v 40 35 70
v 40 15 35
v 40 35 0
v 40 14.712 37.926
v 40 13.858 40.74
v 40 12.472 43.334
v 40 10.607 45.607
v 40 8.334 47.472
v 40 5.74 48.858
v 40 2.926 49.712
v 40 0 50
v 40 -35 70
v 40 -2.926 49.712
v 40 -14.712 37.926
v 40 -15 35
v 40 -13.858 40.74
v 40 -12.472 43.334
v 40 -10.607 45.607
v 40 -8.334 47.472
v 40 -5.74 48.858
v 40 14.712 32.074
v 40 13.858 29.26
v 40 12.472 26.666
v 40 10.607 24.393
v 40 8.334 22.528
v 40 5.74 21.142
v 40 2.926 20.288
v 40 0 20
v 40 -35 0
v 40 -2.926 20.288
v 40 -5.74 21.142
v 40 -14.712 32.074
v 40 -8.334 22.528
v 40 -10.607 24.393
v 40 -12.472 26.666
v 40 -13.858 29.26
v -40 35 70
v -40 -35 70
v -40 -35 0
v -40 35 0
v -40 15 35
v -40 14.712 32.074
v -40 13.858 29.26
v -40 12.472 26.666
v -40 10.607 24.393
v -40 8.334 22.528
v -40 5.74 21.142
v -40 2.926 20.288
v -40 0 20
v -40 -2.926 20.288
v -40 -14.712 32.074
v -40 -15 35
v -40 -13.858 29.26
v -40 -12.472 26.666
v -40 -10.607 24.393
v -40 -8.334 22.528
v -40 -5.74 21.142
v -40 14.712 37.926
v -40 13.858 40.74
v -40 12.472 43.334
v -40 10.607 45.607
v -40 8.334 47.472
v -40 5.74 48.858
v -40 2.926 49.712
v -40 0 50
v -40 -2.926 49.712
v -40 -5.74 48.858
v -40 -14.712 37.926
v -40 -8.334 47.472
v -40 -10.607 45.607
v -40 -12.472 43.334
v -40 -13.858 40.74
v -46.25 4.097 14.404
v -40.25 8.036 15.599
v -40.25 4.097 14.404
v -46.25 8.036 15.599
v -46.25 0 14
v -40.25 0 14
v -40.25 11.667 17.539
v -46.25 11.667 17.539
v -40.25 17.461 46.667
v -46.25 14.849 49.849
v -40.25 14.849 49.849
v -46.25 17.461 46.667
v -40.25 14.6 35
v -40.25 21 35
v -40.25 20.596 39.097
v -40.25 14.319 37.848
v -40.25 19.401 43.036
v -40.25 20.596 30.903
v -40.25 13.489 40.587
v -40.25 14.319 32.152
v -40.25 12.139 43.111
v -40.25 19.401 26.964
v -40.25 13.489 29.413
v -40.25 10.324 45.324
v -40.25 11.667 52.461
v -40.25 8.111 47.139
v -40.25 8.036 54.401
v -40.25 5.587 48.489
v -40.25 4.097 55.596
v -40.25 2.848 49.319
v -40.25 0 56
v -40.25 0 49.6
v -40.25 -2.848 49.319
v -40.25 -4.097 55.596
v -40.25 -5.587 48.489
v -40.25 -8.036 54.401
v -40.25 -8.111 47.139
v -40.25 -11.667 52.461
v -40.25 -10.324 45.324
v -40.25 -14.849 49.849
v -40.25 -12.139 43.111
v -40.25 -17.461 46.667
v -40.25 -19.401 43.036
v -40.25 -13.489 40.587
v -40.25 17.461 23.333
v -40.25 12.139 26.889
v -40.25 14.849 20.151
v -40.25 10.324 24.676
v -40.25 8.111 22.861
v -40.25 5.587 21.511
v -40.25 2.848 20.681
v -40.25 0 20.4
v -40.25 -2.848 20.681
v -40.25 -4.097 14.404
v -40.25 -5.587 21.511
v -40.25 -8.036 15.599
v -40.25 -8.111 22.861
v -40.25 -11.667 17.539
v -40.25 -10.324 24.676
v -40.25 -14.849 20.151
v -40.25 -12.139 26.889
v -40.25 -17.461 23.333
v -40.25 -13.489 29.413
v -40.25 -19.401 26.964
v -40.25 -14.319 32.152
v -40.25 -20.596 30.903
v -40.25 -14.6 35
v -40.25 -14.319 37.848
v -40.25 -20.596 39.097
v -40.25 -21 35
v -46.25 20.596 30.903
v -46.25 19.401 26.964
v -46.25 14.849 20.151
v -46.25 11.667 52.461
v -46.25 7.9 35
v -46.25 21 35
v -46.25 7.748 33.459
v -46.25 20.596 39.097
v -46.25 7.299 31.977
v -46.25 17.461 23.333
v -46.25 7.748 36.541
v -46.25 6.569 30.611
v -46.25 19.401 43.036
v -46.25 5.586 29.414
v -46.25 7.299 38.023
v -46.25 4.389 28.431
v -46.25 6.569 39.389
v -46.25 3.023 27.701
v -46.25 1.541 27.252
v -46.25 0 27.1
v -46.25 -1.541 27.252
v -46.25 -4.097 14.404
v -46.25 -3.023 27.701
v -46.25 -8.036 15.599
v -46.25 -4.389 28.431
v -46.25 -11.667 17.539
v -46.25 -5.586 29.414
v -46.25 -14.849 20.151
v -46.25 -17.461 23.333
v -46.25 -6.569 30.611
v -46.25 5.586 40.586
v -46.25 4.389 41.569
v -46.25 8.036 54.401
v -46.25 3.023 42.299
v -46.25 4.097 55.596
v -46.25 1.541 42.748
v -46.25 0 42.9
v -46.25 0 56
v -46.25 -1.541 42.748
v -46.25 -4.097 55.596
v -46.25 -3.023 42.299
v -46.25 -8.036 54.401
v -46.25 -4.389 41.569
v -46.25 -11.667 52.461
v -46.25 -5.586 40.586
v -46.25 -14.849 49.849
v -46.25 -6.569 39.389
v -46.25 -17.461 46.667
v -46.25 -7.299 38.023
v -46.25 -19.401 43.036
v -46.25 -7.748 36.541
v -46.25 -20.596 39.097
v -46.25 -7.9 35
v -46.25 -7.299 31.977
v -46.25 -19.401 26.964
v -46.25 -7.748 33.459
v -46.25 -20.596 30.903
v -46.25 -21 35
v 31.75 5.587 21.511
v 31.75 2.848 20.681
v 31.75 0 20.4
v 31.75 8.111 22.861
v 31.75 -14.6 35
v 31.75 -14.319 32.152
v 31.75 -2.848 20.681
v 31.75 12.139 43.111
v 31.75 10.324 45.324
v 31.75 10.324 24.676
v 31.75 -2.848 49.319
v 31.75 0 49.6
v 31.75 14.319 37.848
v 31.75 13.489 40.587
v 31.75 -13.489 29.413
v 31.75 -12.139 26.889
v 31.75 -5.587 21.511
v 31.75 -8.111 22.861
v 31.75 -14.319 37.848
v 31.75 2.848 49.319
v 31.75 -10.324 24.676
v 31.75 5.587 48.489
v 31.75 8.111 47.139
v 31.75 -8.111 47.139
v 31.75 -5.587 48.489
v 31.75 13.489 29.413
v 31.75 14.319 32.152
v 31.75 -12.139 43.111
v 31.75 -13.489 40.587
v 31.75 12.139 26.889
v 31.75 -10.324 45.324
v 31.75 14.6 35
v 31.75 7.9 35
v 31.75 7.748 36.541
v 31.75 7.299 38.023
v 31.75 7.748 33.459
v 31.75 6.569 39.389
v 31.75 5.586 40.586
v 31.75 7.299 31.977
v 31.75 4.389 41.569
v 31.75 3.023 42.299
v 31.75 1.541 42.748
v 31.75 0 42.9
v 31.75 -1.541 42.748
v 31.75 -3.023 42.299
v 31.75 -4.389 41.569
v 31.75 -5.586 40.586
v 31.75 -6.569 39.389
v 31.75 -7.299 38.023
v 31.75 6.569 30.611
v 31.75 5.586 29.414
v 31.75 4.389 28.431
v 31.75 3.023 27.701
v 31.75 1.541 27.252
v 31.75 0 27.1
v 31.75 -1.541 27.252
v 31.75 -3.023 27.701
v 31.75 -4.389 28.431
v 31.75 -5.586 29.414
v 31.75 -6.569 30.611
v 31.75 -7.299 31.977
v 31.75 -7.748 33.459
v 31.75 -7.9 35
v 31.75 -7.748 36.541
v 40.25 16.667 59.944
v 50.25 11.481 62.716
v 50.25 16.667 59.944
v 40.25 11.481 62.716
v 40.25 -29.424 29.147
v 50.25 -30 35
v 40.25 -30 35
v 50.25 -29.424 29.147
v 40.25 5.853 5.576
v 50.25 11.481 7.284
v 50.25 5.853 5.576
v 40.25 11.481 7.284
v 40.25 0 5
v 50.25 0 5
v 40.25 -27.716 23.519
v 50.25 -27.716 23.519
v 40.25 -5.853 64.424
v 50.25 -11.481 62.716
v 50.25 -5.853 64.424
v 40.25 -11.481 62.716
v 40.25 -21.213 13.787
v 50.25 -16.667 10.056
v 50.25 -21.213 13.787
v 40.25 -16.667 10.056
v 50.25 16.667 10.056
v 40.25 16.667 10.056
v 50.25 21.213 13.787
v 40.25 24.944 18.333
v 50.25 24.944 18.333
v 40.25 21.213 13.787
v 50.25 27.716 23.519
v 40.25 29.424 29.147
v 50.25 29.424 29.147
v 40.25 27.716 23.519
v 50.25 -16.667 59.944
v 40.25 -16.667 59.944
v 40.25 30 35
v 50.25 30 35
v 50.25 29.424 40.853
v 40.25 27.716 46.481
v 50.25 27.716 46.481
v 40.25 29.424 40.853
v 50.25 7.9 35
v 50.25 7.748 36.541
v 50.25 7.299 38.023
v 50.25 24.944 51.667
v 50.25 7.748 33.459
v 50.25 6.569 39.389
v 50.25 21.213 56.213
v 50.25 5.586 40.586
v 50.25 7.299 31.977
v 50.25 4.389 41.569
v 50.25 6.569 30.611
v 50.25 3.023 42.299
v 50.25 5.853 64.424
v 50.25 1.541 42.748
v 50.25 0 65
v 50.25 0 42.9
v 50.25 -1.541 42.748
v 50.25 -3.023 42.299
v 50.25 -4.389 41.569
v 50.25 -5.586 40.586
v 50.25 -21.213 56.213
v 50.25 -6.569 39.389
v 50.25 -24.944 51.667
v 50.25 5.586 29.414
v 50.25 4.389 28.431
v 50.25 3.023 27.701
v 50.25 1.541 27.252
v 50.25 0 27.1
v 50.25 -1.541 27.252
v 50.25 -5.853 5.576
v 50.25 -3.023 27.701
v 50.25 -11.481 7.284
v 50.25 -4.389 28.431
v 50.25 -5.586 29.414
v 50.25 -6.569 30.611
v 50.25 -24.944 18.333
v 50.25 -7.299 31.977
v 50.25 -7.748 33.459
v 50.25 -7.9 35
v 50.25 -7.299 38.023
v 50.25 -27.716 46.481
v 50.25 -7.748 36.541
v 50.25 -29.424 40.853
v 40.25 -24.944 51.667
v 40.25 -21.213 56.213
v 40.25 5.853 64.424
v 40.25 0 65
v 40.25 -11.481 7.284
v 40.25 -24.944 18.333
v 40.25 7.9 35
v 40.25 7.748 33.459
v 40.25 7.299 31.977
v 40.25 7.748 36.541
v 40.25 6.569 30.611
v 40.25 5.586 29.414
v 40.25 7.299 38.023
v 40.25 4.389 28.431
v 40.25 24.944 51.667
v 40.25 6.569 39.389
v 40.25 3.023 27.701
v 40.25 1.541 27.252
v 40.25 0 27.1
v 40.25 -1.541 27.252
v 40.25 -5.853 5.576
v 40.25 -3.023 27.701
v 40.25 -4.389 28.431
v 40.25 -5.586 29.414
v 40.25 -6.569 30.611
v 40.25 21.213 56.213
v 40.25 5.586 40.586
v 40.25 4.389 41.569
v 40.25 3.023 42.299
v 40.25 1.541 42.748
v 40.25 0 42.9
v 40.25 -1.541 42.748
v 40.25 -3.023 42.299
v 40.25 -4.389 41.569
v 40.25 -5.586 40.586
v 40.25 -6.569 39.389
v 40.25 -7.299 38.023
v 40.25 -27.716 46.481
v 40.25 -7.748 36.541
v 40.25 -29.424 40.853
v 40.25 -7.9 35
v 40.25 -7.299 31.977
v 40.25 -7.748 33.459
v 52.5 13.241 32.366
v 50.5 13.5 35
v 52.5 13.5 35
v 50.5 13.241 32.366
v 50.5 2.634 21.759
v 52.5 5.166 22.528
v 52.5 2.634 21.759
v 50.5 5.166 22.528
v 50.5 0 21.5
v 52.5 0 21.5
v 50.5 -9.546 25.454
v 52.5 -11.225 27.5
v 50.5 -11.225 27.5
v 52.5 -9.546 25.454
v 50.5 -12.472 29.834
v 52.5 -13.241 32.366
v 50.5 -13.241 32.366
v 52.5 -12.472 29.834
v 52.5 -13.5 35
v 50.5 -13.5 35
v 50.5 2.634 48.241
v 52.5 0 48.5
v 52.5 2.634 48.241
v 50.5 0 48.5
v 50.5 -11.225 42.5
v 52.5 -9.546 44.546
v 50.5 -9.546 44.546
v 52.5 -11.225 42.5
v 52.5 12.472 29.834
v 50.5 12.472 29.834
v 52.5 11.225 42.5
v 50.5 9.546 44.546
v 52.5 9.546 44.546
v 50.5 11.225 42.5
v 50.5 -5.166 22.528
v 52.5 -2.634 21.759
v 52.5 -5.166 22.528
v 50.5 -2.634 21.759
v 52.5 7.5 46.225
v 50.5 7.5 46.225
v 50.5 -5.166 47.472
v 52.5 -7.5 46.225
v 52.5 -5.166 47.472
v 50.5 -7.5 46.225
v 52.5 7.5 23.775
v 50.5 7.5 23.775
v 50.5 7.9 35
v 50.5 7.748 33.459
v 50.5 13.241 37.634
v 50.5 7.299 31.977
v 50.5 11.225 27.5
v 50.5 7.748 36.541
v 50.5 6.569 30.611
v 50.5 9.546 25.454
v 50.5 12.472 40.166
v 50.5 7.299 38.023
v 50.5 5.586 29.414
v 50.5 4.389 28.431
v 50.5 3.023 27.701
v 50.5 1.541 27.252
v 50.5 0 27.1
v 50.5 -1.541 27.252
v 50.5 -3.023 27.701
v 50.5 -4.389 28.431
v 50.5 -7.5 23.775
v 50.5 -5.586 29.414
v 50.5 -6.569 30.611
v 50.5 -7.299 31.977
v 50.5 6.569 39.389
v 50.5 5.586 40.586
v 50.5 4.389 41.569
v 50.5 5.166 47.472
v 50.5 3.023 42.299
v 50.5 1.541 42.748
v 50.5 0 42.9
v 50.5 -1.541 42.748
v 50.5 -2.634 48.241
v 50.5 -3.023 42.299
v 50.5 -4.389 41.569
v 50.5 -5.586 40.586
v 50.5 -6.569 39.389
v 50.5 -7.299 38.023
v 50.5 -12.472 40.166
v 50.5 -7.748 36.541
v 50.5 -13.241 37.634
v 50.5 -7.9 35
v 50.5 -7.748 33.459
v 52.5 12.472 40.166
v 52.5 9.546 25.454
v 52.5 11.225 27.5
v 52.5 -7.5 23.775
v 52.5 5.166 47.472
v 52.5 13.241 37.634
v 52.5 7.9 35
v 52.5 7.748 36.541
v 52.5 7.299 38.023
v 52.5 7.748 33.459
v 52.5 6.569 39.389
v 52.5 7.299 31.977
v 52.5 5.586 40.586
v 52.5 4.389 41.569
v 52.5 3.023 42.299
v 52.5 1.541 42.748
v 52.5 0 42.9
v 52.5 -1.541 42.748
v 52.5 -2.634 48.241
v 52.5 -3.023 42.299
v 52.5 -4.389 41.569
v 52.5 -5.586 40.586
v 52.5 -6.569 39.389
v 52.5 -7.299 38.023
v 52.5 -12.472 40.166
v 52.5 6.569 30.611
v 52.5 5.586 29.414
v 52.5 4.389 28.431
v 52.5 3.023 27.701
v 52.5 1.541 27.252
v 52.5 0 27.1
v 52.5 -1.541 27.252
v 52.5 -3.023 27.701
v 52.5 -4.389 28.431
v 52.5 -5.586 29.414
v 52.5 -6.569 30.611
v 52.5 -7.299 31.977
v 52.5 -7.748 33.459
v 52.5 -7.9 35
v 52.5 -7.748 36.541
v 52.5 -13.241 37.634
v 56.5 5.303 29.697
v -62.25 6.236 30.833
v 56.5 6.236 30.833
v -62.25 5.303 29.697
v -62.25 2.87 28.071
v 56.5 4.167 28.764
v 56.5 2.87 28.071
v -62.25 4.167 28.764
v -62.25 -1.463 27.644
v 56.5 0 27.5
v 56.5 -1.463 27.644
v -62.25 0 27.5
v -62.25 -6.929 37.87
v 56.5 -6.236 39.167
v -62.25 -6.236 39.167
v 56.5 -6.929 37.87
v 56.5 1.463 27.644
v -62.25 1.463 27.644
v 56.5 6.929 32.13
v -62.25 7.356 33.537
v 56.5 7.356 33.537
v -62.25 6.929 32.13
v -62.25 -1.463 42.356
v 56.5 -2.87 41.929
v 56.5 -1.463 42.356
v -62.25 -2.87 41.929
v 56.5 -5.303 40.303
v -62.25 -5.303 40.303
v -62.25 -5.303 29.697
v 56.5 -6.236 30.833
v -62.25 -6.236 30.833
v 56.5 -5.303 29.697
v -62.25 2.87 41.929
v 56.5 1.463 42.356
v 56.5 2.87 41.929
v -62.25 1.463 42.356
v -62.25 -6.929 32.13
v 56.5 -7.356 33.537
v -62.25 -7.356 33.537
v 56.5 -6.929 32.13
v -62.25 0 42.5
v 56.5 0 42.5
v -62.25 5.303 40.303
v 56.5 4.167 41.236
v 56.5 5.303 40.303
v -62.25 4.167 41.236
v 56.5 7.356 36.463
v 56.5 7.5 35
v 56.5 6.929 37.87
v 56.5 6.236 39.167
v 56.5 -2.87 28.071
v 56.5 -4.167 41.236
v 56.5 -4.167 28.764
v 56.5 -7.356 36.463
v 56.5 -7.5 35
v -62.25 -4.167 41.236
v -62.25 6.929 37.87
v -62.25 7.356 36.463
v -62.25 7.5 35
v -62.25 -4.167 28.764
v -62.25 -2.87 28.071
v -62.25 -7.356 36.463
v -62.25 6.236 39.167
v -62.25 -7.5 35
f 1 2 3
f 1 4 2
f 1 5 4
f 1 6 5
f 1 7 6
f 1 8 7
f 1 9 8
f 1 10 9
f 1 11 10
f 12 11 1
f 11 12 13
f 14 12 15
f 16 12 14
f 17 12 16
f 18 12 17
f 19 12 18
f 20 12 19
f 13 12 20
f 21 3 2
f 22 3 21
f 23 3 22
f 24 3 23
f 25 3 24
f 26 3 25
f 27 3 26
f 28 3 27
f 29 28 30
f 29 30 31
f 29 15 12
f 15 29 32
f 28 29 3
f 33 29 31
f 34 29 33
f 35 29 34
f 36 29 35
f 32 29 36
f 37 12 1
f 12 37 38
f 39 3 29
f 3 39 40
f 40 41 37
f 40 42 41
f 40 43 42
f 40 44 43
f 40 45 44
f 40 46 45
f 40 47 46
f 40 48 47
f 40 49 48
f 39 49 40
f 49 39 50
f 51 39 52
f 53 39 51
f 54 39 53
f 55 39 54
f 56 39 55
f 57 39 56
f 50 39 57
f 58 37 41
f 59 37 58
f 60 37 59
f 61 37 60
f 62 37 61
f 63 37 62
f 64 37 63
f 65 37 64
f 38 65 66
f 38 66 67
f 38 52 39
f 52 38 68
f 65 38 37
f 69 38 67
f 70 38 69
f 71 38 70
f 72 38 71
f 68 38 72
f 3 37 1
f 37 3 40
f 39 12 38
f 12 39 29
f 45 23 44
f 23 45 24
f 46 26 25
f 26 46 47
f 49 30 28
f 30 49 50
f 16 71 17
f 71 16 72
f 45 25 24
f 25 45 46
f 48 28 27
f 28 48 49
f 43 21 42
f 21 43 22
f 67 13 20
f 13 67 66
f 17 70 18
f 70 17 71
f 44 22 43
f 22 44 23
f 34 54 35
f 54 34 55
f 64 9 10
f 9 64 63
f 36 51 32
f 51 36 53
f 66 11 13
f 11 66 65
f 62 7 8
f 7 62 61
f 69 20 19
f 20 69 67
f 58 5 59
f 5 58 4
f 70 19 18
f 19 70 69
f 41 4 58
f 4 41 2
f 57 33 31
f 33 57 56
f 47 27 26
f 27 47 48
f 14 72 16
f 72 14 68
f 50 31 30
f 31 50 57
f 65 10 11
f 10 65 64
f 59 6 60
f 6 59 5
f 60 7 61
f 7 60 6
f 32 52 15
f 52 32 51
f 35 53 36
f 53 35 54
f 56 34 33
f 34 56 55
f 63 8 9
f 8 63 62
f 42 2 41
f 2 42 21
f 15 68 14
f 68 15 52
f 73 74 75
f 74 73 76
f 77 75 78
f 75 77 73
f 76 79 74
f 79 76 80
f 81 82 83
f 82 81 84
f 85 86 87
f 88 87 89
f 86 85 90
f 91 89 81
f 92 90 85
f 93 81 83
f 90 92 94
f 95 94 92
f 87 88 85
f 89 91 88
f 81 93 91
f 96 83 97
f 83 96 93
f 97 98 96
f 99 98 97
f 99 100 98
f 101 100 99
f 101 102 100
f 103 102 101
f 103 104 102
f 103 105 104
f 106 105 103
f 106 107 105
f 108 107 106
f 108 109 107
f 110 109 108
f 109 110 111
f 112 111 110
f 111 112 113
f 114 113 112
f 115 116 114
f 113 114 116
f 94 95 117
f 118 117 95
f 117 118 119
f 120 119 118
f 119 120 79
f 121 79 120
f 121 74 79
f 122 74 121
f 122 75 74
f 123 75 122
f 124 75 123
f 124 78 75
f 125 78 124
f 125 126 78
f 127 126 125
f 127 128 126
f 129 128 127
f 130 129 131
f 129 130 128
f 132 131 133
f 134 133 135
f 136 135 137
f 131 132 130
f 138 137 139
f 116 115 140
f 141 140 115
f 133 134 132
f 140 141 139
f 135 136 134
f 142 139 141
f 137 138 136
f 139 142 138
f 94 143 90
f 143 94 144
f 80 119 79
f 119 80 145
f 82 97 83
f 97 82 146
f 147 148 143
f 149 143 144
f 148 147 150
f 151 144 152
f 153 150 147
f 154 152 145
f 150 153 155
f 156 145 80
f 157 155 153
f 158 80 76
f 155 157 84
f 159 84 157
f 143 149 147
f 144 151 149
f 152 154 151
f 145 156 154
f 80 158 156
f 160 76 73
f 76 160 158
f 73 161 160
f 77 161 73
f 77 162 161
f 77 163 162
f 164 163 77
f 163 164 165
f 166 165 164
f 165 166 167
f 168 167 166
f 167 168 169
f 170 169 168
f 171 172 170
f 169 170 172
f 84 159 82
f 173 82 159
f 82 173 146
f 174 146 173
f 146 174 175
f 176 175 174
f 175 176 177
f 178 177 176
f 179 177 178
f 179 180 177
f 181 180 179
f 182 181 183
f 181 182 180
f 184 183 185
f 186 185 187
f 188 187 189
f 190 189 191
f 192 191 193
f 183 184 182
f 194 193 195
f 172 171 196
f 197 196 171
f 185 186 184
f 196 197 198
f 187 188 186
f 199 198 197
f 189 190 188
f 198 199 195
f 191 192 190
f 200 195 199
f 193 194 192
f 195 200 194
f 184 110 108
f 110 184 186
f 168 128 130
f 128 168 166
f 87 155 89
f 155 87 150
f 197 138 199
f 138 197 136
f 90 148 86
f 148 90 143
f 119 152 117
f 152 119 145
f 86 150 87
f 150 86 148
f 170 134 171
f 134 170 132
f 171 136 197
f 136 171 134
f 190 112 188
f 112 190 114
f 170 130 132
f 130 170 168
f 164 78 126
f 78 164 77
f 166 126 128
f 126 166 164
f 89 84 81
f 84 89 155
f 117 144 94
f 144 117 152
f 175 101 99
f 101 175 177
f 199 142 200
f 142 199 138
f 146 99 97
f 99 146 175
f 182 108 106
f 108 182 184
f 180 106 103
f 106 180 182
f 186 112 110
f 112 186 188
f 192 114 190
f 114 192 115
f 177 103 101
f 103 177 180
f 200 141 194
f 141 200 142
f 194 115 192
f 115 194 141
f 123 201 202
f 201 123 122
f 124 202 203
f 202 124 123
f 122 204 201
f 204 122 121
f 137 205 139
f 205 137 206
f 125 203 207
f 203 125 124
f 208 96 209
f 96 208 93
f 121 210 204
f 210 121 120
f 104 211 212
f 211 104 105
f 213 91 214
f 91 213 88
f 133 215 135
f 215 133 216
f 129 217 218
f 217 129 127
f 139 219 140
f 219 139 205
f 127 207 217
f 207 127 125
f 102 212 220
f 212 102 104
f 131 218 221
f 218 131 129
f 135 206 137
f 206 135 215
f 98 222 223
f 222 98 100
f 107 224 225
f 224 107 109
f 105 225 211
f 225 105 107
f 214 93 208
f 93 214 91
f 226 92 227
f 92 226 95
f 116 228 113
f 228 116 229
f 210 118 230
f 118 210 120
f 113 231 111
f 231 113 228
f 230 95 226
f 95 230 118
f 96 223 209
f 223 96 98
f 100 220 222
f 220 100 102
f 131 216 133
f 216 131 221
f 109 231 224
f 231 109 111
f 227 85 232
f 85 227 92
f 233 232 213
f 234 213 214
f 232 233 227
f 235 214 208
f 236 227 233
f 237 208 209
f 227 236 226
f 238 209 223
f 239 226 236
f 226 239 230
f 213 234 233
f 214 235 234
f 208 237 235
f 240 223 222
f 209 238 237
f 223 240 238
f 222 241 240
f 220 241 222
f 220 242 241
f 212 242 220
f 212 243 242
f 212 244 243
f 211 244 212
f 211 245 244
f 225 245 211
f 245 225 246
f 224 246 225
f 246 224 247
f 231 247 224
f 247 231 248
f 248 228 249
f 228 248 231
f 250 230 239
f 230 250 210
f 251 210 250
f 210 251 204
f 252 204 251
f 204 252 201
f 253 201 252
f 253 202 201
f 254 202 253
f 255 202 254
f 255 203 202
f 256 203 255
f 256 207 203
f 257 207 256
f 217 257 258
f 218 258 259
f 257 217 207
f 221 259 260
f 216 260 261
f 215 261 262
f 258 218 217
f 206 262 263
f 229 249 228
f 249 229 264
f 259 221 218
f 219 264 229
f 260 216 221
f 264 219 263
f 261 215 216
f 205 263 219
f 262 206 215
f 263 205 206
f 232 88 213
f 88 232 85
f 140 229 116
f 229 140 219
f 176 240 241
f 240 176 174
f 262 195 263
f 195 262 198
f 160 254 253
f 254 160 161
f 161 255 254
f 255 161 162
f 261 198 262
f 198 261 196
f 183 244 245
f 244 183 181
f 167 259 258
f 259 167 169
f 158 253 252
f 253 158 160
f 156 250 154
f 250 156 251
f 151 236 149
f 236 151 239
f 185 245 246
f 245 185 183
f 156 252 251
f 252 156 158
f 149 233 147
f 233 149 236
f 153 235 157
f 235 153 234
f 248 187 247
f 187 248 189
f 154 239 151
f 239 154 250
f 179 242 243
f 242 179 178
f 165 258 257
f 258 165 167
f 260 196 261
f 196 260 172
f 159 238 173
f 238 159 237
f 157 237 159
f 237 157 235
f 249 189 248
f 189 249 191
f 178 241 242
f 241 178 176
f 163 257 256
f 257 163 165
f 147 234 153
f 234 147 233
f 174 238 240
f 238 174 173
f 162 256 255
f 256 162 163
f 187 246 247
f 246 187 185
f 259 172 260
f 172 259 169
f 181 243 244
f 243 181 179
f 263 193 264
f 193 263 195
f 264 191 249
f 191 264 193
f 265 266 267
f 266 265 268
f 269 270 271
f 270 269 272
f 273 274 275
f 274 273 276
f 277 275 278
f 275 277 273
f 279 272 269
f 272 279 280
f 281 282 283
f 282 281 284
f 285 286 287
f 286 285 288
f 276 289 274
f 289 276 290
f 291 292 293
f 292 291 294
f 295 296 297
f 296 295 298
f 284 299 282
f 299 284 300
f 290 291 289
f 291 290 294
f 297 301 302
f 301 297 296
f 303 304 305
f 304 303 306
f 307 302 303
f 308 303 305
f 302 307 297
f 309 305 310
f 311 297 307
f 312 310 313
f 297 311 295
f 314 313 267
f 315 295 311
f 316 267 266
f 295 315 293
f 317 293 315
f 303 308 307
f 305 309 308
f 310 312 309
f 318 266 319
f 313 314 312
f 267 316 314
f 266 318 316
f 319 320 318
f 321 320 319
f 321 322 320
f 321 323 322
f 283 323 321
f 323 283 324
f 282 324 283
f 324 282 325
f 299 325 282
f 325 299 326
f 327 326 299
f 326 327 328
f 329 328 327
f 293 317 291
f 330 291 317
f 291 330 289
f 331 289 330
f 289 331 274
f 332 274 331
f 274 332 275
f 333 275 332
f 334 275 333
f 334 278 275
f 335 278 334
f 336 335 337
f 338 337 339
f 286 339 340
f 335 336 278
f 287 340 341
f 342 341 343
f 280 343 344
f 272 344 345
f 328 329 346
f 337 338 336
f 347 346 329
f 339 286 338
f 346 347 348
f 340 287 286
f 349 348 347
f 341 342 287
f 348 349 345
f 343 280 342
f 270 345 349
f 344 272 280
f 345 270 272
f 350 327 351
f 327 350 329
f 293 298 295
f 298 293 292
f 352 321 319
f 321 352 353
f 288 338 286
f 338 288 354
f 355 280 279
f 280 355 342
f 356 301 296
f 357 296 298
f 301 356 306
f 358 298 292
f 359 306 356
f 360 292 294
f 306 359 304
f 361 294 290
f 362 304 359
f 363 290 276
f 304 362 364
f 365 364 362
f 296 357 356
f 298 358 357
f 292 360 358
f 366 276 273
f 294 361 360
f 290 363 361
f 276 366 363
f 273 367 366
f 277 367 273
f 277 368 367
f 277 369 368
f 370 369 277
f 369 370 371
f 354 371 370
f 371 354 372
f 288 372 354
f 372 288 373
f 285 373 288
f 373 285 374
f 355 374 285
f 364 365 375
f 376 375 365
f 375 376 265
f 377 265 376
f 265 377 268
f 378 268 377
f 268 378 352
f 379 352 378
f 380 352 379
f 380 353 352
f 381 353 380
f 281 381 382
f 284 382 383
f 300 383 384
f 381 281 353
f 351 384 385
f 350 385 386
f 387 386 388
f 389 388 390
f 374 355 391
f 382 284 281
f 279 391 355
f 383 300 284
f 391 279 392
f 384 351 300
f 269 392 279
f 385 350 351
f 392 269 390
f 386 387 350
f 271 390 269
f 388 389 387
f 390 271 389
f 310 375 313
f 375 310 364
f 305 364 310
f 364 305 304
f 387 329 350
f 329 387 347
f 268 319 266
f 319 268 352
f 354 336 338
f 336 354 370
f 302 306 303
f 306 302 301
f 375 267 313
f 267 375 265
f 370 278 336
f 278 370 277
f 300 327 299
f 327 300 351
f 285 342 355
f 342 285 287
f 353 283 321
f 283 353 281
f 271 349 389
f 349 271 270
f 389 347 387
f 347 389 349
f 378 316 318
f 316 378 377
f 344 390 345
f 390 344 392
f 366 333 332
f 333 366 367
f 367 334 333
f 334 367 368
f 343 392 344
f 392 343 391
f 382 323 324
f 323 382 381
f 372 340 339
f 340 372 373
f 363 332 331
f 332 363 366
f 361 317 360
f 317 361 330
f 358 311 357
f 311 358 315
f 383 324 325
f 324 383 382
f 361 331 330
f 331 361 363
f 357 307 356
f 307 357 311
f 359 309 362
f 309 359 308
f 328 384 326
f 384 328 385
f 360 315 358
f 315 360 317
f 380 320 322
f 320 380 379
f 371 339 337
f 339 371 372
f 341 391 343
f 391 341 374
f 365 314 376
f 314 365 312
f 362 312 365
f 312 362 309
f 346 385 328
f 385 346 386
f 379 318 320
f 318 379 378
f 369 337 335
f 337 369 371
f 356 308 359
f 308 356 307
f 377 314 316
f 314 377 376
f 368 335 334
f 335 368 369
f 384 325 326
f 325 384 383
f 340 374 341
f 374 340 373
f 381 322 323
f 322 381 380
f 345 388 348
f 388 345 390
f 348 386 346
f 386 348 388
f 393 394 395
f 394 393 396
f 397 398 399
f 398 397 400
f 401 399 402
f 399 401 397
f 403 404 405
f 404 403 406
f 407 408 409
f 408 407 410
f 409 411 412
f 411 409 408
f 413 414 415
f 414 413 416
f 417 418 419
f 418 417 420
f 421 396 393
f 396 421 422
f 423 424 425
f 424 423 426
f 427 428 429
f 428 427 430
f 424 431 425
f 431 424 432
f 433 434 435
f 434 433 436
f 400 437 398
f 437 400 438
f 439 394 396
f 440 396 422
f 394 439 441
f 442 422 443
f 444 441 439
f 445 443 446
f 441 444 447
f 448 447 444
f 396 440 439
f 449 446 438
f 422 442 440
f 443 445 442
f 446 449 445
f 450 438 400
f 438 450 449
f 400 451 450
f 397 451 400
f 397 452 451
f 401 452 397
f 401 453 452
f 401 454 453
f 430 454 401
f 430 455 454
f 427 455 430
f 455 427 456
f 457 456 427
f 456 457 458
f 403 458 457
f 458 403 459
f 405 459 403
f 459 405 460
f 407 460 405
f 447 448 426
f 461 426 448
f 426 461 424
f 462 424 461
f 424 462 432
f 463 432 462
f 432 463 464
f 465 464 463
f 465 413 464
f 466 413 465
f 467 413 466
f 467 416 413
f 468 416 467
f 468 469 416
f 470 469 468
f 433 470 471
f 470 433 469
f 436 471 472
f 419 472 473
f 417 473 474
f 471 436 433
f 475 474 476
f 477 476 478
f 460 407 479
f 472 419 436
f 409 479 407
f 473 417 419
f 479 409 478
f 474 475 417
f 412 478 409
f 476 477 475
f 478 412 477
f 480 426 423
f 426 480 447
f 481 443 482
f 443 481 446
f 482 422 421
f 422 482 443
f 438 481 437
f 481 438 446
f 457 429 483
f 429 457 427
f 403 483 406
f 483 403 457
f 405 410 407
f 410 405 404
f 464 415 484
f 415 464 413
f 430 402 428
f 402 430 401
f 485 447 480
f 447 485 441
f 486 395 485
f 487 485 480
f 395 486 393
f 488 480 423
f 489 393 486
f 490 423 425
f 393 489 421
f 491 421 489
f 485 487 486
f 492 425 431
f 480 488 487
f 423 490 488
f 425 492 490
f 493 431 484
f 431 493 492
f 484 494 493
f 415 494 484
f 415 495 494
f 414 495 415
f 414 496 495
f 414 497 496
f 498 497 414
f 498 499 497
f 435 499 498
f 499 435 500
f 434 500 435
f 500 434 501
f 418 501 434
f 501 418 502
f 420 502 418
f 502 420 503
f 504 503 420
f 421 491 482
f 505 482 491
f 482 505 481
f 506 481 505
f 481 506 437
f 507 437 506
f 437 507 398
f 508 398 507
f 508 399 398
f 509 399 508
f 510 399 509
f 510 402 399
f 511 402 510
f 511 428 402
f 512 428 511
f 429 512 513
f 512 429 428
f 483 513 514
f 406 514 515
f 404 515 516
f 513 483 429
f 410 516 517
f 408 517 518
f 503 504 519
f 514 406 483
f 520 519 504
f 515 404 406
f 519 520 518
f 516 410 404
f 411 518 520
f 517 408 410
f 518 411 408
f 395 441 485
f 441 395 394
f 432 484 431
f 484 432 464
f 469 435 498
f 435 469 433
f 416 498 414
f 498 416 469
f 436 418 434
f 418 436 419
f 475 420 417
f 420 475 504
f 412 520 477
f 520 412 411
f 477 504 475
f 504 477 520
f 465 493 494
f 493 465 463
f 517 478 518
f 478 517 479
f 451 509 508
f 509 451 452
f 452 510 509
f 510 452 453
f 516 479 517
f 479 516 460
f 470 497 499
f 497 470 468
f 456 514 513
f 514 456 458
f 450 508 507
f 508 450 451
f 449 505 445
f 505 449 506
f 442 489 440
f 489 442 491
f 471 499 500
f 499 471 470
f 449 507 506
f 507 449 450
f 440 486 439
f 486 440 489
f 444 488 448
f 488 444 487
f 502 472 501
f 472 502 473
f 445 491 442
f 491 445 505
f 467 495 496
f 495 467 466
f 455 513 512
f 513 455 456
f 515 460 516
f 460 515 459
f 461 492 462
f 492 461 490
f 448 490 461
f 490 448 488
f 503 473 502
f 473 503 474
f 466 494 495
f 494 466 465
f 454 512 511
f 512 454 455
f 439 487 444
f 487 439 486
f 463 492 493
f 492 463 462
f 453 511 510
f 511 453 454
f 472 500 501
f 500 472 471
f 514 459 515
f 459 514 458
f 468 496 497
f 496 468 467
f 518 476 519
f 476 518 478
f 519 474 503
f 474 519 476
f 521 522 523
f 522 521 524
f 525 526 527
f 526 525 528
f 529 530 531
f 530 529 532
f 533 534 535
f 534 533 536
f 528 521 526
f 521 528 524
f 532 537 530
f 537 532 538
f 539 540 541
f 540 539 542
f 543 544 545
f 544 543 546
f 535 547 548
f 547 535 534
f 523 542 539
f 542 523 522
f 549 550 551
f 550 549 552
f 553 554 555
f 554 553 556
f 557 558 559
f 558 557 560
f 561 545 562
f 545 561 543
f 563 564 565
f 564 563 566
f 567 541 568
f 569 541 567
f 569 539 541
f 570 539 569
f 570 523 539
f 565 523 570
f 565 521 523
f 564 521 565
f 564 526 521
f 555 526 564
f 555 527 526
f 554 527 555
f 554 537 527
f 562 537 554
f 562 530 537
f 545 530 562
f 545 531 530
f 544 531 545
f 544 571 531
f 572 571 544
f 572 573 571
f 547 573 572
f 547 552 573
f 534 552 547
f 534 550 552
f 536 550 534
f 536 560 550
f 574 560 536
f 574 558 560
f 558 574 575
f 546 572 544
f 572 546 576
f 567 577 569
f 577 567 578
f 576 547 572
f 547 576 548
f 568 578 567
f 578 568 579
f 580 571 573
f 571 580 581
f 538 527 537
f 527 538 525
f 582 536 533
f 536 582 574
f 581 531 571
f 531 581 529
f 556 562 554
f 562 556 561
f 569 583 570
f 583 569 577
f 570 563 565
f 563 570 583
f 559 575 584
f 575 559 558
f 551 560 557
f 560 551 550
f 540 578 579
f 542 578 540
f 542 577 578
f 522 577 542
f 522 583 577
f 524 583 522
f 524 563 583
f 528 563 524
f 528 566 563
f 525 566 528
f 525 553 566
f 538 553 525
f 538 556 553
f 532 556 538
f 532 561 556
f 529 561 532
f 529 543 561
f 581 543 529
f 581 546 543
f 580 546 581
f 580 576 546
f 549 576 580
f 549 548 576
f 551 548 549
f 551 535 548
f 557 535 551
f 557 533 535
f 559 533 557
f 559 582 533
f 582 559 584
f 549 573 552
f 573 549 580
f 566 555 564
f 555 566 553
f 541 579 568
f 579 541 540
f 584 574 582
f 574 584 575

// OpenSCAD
$fn = 32;

// ------------------------------------------------------------------------
// Bushed housing: 80 x 70 x 70 mm housing, bushing d29.2
// Every part is its own module, assembly() places them once.
// ------------------------------------------------------------------------

// --- part 1 ---
module housing() {
  difference() {
    translate([-40, -35, 0]) cube([80, 70, 70]);
    translate([0, 0, 35]) rotate([0, 90, 0]) cylinder(h = 82, d = 30, center = true);
  }
}

// --- part 2 ---
module bushing() {
  difference() {
    union() {
      cylinder(h = 6, d = 42);
      translate([0, 0, 6]) cylinder(h = 72, d = 29.2);
    }
    translate([0, 0, -1]) cylinder(h = 80, d = 15.8);
  }
}

// --- part 3 ---
module shaft() {
  translate([0, 0, -59.375]) cylinder(h = 118.75, d = 15);
}

// --- part 4 ---
module cover() {
  difference() {
    cylinder(h = 10, d = 60);
    translate([0, 0, -1]) cylinder(h = 12, d = 15.8);
  }
}

// --- part 5 ---
module washer() {
  difference() {
      translate([0, 0, 0]) cylinder(h = 2, d = 27);
      translate([0, 0, -1]) cylinder(h = 4, d = 15.8);
    }
}

// --- assembly ---
module assembly() {
  translate([0, 0, 0]) rotate([0, 0, 0]) housing();
  translate([-46.25, 0, 35]) rotate([0, 90, 0]) bushing();
  translate([-2.875, 0, 35]) rotate([0, 90, 0]) shaft();
  translate([40.25, 0, 35]) rotate([0, 90, 0]) cover();
  translate([50.5, 0, 35]) rotate([0, 90, 0]) washer();
}

assembly();
